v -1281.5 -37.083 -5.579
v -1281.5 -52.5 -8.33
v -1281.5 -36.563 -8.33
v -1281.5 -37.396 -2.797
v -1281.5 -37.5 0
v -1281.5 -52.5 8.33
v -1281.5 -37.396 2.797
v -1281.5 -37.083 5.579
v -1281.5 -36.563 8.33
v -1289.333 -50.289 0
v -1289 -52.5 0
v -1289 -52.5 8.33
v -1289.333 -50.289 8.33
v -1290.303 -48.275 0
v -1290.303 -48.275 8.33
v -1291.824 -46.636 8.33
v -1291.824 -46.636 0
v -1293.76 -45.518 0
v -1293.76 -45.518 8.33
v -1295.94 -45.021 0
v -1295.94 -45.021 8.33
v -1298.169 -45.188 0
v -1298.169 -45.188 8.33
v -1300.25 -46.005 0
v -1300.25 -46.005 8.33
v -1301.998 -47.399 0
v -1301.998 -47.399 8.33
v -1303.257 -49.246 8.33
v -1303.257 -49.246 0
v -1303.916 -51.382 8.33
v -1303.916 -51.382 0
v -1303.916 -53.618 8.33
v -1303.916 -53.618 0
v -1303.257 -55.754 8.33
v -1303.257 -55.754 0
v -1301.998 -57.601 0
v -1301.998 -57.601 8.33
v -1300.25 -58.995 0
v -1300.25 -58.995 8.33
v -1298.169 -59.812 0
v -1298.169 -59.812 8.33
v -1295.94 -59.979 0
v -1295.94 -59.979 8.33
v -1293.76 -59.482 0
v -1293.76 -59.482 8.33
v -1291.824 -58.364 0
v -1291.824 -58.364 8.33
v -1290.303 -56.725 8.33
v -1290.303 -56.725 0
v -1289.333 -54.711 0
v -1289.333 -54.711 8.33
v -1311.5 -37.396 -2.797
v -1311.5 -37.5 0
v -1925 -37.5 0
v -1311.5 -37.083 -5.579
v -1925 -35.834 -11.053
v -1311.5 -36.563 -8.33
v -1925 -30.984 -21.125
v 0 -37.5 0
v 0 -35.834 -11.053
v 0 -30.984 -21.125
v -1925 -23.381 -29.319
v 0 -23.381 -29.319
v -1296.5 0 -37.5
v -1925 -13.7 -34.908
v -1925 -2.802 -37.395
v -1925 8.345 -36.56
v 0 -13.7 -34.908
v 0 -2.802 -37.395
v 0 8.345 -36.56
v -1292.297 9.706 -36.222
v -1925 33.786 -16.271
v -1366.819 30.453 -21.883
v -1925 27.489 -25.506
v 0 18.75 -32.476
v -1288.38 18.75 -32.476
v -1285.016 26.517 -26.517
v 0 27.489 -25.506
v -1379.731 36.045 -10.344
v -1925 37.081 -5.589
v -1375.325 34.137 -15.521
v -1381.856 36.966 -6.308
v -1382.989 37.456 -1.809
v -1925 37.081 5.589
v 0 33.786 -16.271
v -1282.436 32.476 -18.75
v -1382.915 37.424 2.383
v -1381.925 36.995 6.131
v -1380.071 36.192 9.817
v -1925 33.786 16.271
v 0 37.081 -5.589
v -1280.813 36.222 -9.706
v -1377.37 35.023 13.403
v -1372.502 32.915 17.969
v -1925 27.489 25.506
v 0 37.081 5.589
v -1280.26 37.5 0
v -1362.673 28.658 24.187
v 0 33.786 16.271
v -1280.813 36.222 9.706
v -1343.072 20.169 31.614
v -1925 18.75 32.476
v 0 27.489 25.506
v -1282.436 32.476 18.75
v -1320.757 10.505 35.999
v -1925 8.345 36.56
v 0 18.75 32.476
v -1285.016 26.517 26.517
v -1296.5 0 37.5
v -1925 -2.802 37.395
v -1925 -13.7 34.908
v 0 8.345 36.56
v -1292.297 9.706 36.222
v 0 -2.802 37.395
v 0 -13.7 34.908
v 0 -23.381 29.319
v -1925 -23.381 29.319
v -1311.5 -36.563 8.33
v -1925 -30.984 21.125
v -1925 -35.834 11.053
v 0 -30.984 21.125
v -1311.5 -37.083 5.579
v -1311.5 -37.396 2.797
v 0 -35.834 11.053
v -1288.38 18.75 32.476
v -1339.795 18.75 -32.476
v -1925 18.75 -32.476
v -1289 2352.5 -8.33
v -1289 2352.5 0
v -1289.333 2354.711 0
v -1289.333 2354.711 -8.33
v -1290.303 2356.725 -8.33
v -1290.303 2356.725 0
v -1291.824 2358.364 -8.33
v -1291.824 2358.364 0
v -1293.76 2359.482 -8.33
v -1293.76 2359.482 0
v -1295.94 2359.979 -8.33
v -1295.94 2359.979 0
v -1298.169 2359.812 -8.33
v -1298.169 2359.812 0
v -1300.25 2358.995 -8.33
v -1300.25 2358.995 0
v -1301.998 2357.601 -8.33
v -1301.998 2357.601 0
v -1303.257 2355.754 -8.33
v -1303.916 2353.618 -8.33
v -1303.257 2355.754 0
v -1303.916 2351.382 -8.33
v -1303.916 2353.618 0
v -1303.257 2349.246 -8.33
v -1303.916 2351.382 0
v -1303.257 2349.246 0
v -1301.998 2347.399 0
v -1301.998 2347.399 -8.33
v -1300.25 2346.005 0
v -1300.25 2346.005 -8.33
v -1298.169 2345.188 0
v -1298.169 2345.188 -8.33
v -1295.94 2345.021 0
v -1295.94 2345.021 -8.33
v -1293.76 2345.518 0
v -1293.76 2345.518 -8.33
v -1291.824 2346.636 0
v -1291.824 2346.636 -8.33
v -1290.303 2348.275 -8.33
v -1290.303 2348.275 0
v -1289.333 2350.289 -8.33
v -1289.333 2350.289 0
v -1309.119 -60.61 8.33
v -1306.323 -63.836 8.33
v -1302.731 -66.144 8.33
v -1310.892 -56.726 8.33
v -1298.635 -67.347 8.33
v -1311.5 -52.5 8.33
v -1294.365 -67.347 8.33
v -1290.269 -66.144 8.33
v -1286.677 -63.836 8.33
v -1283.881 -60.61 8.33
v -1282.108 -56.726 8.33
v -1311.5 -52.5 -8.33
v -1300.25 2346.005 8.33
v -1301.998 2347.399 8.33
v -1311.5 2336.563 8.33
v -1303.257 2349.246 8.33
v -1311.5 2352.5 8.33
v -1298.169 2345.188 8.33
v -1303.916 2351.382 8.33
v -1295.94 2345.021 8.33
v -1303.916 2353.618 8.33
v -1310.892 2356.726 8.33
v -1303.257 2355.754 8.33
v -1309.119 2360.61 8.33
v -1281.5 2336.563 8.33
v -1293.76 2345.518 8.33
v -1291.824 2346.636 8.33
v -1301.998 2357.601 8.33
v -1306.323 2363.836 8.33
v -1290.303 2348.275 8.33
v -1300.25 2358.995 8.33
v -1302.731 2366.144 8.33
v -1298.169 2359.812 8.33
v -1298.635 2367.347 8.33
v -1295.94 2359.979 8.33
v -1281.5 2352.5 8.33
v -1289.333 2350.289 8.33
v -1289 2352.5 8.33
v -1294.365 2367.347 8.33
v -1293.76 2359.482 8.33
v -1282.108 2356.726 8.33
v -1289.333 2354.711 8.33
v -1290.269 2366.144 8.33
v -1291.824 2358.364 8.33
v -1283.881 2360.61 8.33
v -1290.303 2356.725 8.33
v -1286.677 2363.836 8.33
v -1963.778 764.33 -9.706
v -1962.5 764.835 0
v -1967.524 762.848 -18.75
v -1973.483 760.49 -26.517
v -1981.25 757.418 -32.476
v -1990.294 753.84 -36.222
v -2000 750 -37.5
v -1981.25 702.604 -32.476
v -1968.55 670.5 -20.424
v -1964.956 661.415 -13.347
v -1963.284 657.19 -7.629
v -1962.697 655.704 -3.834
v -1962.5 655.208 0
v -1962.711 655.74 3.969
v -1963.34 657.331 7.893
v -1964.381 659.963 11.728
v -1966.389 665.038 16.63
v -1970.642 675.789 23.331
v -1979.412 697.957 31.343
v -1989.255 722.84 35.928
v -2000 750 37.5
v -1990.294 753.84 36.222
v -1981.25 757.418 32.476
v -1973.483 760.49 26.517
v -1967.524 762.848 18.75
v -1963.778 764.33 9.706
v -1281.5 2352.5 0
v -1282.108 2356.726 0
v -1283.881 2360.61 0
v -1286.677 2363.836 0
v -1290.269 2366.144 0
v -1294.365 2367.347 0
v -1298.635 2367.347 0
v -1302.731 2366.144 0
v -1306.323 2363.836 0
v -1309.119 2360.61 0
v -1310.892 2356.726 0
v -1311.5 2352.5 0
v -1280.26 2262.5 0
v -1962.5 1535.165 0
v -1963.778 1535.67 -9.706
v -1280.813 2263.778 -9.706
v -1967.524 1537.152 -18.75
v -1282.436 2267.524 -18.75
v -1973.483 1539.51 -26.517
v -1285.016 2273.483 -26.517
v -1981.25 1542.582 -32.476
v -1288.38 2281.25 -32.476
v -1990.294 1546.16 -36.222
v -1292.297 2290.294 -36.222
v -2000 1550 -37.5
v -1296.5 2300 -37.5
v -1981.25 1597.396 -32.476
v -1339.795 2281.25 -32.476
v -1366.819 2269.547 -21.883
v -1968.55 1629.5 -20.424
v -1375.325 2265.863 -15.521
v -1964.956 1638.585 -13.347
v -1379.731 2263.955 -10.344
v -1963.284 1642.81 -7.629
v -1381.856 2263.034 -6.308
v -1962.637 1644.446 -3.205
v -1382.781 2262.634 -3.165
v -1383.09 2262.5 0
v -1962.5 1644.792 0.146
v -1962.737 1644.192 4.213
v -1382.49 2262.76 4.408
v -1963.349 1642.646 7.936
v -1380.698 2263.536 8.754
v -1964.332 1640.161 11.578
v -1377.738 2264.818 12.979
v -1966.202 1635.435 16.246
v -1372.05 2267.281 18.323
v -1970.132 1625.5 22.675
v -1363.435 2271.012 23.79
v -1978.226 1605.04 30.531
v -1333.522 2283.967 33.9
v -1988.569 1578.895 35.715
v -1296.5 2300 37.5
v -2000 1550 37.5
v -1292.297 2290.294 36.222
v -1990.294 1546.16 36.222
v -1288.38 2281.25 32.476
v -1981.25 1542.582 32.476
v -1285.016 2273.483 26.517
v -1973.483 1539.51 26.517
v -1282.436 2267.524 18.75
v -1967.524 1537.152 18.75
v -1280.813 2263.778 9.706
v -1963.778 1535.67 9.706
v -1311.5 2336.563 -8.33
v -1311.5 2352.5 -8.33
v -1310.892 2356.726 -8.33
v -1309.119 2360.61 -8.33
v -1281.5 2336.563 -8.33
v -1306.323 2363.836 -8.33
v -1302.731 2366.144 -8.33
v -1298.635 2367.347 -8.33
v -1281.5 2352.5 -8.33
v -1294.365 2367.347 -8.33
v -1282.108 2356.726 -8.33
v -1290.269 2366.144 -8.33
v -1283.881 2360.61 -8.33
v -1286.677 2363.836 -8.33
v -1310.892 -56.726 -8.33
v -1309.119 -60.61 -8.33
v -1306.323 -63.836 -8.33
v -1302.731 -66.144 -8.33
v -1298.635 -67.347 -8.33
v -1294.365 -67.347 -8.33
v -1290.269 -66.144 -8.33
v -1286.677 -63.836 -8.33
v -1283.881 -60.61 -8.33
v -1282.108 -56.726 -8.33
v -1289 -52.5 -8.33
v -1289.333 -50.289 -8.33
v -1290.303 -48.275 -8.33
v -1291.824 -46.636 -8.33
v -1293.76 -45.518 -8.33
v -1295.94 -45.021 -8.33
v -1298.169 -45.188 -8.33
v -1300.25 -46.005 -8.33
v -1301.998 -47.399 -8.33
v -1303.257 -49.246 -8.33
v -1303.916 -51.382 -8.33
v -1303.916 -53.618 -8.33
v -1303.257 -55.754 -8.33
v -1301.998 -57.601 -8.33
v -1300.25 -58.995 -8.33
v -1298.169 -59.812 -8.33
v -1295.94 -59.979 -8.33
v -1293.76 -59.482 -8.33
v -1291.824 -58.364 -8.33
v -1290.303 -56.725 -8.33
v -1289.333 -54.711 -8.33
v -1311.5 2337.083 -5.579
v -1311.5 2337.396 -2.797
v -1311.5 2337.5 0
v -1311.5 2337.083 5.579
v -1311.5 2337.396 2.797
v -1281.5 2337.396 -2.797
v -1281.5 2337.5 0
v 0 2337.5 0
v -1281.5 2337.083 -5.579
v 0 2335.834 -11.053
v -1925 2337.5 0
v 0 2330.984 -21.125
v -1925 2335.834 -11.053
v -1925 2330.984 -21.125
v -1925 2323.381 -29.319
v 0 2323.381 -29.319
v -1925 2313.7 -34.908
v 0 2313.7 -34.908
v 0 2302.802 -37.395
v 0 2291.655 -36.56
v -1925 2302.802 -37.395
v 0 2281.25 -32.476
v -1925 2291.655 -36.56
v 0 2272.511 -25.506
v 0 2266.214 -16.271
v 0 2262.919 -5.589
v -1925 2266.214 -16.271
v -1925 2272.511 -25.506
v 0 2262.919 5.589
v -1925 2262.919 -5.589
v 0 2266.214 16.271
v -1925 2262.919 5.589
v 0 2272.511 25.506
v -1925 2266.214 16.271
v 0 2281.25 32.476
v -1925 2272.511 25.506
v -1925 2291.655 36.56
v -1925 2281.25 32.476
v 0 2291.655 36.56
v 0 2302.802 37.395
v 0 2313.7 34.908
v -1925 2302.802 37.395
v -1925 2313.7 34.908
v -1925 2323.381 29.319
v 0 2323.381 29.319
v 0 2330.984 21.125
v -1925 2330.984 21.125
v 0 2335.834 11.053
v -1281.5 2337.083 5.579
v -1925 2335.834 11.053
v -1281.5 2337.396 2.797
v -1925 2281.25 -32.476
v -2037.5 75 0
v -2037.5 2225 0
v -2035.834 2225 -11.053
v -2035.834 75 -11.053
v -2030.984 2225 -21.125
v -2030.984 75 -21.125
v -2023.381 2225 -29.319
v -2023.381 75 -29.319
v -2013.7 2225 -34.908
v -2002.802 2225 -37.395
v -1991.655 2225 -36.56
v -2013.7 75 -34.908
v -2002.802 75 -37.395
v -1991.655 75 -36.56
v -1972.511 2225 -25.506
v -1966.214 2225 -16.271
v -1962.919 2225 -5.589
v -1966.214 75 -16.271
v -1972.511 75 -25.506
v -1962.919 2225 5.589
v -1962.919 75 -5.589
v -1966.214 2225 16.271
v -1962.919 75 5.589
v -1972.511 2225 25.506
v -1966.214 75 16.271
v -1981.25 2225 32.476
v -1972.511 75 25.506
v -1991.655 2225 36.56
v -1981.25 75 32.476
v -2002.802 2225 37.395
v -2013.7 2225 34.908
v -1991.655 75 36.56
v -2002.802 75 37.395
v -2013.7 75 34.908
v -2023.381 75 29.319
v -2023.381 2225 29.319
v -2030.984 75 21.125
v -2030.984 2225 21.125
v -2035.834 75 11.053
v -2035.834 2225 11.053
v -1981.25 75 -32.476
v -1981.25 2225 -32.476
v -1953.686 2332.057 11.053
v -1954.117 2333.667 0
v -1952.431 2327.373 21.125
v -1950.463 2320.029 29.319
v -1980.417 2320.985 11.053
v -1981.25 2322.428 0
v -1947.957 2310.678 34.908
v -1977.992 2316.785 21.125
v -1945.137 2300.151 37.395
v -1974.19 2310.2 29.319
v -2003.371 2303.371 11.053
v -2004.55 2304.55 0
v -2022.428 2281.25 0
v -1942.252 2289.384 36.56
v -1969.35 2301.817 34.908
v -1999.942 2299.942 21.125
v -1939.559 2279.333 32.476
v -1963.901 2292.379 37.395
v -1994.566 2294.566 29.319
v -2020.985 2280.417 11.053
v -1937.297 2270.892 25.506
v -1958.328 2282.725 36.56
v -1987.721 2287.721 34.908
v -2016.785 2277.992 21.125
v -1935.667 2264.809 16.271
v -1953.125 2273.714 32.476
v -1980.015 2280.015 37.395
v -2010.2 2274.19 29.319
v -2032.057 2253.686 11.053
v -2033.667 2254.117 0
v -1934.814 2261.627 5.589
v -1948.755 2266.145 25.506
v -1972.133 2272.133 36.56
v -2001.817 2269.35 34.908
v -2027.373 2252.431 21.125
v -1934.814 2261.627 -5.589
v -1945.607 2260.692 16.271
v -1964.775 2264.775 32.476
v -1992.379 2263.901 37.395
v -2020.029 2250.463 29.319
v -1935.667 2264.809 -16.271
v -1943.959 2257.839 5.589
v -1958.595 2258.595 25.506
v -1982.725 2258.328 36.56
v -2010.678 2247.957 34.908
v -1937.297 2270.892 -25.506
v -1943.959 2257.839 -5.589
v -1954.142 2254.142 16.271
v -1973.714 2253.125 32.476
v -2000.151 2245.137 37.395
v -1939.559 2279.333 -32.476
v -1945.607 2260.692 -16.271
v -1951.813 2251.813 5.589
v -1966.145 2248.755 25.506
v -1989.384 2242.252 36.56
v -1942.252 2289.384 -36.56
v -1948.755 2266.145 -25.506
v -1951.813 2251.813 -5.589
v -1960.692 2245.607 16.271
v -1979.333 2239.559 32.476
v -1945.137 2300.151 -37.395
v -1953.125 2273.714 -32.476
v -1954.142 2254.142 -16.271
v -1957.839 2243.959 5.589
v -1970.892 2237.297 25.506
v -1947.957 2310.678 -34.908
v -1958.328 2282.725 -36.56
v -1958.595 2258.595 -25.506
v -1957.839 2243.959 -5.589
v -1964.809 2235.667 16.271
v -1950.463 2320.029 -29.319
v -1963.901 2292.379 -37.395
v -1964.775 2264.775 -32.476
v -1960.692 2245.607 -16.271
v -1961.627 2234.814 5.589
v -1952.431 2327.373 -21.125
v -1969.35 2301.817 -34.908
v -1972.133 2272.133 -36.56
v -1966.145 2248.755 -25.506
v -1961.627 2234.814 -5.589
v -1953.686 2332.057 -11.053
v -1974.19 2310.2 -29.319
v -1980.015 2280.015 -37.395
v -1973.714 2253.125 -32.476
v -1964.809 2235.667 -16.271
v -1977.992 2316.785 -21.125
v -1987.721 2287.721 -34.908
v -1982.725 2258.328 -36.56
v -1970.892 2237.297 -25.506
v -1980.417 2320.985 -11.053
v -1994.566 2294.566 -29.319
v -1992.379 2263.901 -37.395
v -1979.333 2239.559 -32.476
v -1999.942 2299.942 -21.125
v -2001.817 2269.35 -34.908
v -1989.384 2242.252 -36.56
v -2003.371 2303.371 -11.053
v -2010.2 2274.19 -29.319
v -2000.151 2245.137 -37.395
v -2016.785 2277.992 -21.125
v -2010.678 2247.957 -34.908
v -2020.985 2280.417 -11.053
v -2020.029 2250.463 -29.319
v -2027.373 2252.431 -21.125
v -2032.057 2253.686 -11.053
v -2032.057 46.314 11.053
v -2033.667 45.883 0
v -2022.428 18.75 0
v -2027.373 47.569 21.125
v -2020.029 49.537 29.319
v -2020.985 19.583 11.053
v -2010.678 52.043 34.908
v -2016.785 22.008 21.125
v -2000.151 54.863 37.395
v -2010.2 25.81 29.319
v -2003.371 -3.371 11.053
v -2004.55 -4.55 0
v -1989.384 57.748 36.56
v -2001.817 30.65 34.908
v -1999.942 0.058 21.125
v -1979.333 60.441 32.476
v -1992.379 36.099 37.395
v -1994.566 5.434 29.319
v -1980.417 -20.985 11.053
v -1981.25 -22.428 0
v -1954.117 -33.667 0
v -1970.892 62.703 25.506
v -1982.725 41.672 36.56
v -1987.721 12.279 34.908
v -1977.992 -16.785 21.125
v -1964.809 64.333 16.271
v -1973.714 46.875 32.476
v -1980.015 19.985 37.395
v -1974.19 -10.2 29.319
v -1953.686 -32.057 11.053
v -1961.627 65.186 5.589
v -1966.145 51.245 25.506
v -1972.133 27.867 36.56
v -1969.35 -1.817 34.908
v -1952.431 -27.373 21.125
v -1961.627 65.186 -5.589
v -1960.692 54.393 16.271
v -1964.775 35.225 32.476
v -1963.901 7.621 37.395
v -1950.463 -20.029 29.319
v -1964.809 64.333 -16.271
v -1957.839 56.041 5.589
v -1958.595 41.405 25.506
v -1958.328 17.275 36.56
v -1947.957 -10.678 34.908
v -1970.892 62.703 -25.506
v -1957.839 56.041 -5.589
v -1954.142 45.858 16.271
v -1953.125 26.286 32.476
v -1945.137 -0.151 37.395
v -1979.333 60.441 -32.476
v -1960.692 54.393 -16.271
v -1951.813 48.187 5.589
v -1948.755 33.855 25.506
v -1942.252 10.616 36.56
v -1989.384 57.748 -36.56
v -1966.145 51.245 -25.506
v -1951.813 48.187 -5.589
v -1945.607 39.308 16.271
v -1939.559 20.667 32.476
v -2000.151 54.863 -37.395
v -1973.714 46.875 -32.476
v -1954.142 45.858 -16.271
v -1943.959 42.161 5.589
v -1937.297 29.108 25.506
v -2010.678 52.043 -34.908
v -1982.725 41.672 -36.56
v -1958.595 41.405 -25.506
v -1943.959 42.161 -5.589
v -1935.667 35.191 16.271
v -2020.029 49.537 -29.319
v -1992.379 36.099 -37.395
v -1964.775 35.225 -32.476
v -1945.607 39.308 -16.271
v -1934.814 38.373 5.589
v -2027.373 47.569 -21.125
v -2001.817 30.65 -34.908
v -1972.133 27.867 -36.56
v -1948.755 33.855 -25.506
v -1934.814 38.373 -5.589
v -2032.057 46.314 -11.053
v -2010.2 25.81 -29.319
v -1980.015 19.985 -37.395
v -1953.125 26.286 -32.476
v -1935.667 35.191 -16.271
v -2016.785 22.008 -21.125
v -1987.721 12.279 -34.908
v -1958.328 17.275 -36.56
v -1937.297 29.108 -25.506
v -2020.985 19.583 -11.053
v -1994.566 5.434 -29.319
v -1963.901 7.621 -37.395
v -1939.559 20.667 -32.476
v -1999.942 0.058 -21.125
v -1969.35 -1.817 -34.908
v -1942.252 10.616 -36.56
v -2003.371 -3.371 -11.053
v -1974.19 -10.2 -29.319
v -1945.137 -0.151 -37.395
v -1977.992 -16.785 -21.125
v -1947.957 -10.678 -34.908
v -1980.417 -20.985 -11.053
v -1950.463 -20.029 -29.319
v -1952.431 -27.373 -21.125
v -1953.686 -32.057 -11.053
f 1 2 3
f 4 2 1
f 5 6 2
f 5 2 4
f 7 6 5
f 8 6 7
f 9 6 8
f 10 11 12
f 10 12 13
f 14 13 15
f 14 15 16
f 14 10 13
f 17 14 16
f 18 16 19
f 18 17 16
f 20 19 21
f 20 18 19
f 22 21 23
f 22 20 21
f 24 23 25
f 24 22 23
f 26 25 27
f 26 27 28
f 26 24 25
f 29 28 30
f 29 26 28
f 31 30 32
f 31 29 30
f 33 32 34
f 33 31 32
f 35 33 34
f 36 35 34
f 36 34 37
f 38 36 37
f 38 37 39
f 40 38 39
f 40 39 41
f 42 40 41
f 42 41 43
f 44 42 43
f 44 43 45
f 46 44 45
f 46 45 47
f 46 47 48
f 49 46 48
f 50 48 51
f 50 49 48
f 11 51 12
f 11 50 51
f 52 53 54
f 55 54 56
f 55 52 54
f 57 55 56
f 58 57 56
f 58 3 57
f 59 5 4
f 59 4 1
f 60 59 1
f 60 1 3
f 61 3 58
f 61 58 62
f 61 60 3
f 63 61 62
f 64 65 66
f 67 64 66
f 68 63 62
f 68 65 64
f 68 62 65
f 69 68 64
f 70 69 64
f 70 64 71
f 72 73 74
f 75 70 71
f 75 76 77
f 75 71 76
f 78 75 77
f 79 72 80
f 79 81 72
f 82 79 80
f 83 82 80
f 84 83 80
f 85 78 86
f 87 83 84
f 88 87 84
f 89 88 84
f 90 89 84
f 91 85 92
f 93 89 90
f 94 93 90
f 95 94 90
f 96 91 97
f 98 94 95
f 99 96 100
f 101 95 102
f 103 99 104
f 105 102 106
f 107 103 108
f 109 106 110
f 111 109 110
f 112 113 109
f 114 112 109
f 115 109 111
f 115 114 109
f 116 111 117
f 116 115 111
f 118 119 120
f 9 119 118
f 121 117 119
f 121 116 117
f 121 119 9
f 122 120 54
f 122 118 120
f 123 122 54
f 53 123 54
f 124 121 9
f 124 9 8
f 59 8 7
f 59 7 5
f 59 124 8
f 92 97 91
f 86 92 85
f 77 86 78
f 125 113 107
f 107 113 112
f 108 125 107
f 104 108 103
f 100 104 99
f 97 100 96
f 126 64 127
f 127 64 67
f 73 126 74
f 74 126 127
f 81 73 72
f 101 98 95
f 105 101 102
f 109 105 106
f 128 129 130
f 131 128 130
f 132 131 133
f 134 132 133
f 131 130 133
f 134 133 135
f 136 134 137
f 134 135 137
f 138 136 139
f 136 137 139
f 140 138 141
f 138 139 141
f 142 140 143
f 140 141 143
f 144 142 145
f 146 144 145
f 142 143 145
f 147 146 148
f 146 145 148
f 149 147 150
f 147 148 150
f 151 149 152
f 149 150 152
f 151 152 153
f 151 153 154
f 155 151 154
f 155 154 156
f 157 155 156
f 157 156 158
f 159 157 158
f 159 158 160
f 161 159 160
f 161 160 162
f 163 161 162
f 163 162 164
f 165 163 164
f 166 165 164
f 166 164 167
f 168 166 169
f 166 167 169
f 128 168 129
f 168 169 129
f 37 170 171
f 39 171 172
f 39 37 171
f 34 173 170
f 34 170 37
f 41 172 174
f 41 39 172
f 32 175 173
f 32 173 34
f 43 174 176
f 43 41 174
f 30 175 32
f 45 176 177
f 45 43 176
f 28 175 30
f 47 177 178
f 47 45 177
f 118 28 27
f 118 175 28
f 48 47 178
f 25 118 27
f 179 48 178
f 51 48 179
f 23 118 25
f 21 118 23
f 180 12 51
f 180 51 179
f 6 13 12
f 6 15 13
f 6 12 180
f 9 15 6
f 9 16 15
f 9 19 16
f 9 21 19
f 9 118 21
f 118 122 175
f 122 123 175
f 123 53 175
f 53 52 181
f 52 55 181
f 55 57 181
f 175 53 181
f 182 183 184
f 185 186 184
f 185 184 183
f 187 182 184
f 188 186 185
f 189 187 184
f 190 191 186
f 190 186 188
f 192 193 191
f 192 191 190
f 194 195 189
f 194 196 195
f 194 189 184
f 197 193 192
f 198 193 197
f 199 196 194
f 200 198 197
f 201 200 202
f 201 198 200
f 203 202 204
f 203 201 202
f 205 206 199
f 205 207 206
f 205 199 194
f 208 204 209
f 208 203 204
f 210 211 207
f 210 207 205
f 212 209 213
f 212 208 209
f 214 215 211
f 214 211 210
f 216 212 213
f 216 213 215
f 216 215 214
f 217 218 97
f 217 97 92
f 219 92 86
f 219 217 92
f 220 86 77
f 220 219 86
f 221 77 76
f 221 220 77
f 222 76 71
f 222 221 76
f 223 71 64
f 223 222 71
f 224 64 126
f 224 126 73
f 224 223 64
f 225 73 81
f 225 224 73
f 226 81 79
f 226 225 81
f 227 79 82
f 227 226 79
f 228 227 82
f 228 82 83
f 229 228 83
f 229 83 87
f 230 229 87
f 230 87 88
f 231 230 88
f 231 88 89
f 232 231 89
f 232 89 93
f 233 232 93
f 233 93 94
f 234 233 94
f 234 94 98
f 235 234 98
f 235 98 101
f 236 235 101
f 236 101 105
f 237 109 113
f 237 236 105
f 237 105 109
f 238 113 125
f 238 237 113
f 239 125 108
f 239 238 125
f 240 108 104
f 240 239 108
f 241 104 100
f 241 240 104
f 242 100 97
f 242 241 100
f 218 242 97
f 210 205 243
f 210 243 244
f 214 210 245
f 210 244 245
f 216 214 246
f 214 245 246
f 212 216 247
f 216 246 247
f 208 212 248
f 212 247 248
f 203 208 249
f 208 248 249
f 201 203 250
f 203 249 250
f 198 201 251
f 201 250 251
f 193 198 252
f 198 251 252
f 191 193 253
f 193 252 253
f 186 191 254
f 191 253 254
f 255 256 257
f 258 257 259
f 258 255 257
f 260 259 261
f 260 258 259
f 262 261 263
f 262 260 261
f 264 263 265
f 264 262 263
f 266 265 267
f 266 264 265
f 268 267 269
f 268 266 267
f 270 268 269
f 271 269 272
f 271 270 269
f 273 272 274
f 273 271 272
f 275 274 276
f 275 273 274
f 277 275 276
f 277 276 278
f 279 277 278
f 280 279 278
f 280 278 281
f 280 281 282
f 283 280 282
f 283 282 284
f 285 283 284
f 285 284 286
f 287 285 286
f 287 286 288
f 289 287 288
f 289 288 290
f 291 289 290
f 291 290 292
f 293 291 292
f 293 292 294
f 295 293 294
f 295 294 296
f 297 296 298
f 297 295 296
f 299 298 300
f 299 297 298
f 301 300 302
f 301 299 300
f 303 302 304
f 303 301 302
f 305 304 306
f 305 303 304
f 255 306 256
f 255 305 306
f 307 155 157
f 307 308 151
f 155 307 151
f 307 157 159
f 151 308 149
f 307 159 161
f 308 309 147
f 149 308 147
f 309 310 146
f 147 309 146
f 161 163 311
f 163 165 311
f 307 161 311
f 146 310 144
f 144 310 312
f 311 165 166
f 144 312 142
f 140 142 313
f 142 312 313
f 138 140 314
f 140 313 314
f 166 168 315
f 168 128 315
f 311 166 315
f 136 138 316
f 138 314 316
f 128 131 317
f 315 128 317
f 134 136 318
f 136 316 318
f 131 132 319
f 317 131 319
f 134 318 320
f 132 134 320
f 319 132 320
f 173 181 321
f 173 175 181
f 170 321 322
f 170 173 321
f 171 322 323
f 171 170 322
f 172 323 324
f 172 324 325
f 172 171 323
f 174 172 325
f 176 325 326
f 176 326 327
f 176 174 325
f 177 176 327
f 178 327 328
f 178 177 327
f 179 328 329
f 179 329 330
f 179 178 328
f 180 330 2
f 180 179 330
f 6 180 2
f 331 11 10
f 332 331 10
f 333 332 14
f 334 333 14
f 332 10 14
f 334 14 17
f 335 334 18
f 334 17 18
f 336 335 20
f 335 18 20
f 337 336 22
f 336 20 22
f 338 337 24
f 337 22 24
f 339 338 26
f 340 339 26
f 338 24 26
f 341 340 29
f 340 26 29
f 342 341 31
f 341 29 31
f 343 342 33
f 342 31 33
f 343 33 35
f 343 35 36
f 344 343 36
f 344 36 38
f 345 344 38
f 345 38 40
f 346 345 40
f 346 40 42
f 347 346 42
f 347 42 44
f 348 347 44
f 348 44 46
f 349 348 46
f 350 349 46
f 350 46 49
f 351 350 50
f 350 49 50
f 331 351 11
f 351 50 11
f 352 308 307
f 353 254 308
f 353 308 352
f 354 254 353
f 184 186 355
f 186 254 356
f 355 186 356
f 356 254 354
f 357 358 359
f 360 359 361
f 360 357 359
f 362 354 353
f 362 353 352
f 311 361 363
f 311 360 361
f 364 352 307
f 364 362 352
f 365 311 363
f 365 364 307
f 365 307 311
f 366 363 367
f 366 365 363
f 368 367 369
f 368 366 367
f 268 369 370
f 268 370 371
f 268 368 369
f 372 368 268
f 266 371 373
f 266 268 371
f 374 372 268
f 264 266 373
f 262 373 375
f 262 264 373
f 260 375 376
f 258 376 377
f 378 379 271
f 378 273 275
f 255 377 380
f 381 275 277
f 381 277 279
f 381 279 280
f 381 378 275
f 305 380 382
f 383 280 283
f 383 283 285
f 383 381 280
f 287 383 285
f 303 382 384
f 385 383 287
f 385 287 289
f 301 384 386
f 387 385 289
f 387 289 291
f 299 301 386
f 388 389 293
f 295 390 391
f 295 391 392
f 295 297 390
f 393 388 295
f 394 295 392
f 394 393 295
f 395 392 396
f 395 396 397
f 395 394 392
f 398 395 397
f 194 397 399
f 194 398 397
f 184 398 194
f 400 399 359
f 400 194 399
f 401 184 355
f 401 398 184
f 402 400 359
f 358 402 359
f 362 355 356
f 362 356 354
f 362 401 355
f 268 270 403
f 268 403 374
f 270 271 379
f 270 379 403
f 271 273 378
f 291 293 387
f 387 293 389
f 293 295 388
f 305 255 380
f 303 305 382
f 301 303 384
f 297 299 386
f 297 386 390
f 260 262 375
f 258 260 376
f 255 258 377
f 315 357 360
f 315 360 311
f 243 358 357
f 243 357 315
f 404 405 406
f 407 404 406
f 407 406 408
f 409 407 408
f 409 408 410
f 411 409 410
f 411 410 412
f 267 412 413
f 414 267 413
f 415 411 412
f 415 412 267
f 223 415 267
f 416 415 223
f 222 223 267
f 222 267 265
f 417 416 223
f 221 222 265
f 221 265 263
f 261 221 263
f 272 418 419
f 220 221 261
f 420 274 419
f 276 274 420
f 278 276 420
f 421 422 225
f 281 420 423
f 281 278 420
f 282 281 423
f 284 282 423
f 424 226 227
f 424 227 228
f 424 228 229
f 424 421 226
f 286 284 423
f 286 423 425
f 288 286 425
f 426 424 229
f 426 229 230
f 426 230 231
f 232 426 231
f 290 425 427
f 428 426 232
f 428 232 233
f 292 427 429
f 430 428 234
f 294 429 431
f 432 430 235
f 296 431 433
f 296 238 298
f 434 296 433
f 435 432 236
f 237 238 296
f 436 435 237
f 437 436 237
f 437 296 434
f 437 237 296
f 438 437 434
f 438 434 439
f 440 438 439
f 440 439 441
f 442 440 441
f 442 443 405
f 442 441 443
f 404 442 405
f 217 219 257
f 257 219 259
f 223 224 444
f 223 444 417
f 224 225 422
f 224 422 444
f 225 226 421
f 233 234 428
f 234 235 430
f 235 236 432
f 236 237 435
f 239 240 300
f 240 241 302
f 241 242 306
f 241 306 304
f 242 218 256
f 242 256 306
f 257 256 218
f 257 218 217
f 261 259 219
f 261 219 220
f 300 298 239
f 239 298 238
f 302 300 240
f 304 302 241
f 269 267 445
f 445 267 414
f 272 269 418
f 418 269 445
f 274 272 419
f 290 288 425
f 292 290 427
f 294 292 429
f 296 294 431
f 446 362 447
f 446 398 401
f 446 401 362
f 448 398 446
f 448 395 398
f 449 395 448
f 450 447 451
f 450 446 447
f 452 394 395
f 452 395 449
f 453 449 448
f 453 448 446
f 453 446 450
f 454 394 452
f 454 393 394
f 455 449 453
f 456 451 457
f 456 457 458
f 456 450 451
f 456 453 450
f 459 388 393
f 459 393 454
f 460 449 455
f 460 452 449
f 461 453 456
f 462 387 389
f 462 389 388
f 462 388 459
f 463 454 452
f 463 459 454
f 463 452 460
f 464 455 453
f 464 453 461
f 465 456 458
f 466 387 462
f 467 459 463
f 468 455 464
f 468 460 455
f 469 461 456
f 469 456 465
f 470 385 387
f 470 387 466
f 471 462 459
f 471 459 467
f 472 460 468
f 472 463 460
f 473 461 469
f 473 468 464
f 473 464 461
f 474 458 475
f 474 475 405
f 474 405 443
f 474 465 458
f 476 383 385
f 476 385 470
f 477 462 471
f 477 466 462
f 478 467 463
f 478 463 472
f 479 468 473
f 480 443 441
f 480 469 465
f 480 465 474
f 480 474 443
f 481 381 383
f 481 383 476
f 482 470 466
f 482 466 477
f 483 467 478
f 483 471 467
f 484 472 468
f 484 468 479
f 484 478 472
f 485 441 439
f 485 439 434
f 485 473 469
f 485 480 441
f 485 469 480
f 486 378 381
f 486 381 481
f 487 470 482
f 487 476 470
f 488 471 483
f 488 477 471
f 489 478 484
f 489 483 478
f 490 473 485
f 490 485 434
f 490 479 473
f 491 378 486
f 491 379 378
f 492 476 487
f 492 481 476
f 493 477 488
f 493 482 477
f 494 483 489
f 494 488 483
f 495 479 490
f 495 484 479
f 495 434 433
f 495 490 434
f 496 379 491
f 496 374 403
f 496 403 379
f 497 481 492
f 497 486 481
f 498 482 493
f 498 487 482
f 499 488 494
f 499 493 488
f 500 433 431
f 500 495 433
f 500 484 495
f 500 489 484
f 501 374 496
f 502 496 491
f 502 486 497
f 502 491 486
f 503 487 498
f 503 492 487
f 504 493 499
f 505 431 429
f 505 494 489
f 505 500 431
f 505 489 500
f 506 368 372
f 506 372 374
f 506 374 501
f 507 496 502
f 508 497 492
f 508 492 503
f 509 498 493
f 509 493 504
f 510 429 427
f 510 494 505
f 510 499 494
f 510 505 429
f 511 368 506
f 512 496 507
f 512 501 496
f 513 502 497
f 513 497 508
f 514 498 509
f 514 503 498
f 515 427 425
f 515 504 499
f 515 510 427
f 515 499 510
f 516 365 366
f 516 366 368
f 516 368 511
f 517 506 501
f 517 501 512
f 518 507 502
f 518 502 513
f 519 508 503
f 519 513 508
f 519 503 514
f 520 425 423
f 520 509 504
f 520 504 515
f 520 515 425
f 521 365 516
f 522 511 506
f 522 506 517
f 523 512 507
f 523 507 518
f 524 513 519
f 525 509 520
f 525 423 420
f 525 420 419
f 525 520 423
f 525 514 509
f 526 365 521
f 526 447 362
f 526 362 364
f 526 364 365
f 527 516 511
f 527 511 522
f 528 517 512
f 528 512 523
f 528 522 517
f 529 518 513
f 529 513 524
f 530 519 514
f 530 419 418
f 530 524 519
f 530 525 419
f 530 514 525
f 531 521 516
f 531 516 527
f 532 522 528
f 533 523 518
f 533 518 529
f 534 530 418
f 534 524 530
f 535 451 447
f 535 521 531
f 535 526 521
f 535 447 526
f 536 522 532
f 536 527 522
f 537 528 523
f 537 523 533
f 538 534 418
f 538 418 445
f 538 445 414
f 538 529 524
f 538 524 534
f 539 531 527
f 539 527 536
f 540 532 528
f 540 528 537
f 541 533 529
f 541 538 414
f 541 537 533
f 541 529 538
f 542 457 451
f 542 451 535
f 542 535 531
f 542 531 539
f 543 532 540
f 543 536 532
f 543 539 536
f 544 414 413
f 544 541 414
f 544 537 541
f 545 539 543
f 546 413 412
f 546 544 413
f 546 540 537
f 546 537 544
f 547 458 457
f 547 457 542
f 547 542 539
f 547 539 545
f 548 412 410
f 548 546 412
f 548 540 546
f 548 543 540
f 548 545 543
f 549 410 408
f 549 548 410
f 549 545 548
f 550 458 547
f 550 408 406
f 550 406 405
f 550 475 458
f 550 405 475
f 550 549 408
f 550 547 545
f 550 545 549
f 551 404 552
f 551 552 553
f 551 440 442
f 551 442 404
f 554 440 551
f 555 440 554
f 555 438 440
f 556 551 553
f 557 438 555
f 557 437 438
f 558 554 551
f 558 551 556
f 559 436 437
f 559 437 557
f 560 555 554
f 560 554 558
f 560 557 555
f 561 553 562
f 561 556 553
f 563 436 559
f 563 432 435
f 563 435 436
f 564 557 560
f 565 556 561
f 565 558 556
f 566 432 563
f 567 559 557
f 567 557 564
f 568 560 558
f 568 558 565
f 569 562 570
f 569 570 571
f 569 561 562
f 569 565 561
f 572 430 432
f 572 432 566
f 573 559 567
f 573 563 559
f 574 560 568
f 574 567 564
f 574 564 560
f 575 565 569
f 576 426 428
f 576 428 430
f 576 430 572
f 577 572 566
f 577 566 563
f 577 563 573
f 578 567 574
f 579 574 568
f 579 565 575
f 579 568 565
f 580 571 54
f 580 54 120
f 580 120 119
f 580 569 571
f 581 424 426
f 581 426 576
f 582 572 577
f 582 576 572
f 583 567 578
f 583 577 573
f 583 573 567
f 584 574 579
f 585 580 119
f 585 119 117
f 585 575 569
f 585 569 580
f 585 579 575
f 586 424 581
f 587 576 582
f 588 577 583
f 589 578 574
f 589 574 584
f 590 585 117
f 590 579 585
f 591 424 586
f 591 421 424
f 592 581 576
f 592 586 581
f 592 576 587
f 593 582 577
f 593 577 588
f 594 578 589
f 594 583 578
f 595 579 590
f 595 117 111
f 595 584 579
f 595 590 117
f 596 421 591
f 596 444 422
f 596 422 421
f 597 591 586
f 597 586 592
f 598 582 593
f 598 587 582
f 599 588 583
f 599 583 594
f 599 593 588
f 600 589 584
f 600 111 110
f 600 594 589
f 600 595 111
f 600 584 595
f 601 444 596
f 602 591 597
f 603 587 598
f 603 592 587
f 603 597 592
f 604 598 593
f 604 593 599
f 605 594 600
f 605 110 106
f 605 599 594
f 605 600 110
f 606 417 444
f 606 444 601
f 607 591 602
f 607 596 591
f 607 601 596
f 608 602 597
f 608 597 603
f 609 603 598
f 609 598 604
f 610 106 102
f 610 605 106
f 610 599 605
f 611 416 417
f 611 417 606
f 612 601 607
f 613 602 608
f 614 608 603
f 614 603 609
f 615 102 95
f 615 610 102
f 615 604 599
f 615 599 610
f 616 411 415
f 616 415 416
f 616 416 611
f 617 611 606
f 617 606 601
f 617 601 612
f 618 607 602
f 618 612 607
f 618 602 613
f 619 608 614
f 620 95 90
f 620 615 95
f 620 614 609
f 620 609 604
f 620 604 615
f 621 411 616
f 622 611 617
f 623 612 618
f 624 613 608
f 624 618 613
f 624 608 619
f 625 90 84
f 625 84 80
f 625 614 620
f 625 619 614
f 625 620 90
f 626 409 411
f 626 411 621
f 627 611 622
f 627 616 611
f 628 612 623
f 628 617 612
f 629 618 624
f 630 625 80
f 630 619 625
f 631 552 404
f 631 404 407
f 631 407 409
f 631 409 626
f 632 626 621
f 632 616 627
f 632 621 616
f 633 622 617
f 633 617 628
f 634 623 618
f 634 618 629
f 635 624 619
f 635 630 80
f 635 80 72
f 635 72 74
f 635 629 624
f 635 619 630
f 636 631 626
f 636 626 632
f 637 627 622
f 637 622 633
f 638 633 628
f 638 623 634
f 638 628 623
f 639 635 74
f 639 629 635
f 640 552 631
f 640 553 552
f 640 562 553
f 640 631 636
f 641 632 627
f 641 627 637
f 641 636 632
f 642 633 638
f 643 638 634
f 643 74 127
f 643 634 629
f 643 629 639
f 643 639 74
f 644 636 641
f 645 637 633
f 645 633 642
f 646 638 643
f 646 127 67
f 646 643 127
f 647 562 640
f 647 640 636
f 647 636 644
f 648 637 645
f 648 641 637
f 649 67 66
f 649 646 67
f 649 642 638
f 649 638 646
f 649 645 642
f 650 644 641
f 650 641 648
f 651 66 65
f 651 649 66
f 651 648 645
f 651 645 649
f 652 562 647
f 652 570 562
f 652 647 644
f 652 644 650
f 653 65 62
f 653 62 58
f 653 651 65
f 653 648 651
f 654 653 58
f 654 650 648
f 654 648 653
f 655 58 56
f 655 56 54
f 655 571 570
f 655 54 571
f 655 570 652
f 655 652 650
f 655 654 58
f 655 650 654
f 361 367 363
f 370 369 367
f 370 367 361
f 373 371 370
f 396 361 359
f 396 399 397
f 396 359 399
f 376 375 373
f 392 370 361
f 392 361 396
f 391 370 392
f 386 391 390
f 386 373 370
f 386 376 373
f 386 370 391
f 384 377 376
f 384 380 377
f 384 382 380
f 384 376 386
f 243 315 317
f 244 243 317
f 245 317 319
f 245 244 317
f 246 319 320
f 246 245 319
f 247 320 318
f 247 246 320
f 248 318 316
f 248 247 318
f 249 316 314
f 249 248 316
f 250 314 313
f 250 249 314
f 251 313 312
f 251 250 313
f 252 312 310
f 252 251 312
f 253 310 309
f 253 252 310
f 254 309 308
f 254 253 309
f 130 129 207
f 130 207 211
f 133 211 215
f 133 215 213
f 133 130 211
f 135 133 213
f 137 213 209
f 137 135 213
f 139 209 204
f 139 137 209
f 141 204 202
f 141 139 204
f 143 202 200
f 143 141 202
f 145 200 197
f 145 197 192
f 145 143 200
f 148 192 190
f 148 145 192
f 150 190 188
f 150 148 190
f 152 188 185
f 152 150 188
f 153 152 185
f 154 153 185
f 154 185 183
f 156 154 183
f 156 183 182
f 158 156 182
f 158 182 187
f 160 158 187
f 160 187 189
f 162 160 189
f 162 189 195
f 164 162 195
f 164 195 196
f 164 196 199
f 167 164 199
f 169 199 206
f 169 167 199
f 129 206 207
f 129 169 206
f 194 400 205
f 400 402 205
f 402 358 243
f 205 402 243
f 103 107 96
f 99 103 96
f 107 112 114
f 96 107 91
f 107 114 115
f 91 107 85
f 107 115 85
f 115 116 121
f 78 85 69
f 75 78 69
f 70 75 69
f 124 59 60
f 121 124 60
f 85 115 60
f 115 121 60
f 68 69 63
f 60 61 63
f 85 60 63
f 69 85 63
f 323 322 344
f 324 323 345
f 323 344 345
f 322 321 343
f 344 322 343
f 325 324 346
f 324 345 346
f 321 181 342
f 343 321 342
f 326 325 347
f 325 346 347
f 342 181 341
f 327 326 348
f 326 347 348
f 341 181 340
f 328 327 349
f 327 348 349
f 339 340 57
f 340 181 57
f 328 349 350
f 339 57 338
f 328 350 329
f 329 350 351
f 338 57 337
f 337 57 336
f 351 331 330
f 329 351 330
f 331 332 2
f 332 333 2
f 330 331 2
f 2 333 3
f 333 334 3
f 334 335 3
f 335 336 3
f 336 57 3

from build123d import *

# Parameters (mm, degrees)
F0_R          = 37.5
F3_R          = 37.5
F6_R          = 7.5
F7_DEPTH      = 8.33
F7_DEPTH_BACK = 8.33


with BuildPart() as f2:
    # F2: sweep along a path in F1
    with BuildLine(Plane.XY) as f2_path:
        Line((0, 2300), (-1925, 2300))
        ThreePointArc((-1925, 2300), (-1978.033008589, 2278.033008589), (-2000, 2225))
        Line((-2000, 2225), (-2000, 75))
        ThreePointArc((-2000, 75), (-1978.033008589, 21.966991411), (-1925, 0))
        Line((-1925, 0), (0, 0))
    # F0 (on Right) → F2 (sweep)
    with BuildSketch(Plane.YZ):
        with Locations((2300, 0)):
            Circle(F0_R)
    sweep(path=f2_path.line)

    # F5: sweep along a path in F4
    with BuildLine(Plane.XY) as f5_path:
        Line((0, 0), (-1296.5, 0))
        Line((-1296.5, 0), (-2000, 750))
        Line((-2000, 750), (-2000, 1550))
        Line((-2000, 1550), (-1296.5, 2300))
    # F3 (on Right) → F5 (sweep)
    with BuildSketch(Plane.YZ):
        Circle(F3_R)
    sweep(path=f5_path.line, transition=Transition.RIGHT)

    # F6 (on Top) → F7 (join, two sides)
    with BuildSketch(Plane.XY) as f7_sk:
        with BuildLine():
            Line((-1281.5, 0), (-1311.5, 0))
            Line((-1311.5, 0), (-1311.5, -52.5))
            ThreePointArc((-1311.5, -52.5), (-1307.1066017178, -63.1066017178), (-1296.5, -67.5))
            ThreePointArc((-1296.5, -67.5), (-1285.8933982822, -63.1066017178), (-1281.5, -52.5))
            Line((-1281.5, -52.5), (-1281.5, 0))
        make_face()
        with Locations((-1296.5, -52.5)):
            Circle(F6_R, mode=Mode.SUBTRACT)
        with BuildLine():
            Line((-1311.5, 2300), (-1281.5, 2300))
            Line((-1281.5, 2300), (-1281.5, 2352.5))
            ThreePointArc((-1281.5, 2352.5), (-1285.8933982822, 2363.1066017178), (-1296.5, 2367.5))
            ThreePointArc((-1296.5, 2367.5), (-1307.1066017178, 2363.1066017178), (-1311.5, 2352.5))
            Line((-1311.5, 2352.5), (-1311.5, 2300))
        make_face()
        with Locations((-1296.5, 2352.5)):
            Circle(F6_R, mode=Mode.SUBTRACT)
    extrude(amount=F7_DEPTH)
    extrude(f7_sk.sketch, amount=-F7_DEPTH_BACK)


solid = f2.part
